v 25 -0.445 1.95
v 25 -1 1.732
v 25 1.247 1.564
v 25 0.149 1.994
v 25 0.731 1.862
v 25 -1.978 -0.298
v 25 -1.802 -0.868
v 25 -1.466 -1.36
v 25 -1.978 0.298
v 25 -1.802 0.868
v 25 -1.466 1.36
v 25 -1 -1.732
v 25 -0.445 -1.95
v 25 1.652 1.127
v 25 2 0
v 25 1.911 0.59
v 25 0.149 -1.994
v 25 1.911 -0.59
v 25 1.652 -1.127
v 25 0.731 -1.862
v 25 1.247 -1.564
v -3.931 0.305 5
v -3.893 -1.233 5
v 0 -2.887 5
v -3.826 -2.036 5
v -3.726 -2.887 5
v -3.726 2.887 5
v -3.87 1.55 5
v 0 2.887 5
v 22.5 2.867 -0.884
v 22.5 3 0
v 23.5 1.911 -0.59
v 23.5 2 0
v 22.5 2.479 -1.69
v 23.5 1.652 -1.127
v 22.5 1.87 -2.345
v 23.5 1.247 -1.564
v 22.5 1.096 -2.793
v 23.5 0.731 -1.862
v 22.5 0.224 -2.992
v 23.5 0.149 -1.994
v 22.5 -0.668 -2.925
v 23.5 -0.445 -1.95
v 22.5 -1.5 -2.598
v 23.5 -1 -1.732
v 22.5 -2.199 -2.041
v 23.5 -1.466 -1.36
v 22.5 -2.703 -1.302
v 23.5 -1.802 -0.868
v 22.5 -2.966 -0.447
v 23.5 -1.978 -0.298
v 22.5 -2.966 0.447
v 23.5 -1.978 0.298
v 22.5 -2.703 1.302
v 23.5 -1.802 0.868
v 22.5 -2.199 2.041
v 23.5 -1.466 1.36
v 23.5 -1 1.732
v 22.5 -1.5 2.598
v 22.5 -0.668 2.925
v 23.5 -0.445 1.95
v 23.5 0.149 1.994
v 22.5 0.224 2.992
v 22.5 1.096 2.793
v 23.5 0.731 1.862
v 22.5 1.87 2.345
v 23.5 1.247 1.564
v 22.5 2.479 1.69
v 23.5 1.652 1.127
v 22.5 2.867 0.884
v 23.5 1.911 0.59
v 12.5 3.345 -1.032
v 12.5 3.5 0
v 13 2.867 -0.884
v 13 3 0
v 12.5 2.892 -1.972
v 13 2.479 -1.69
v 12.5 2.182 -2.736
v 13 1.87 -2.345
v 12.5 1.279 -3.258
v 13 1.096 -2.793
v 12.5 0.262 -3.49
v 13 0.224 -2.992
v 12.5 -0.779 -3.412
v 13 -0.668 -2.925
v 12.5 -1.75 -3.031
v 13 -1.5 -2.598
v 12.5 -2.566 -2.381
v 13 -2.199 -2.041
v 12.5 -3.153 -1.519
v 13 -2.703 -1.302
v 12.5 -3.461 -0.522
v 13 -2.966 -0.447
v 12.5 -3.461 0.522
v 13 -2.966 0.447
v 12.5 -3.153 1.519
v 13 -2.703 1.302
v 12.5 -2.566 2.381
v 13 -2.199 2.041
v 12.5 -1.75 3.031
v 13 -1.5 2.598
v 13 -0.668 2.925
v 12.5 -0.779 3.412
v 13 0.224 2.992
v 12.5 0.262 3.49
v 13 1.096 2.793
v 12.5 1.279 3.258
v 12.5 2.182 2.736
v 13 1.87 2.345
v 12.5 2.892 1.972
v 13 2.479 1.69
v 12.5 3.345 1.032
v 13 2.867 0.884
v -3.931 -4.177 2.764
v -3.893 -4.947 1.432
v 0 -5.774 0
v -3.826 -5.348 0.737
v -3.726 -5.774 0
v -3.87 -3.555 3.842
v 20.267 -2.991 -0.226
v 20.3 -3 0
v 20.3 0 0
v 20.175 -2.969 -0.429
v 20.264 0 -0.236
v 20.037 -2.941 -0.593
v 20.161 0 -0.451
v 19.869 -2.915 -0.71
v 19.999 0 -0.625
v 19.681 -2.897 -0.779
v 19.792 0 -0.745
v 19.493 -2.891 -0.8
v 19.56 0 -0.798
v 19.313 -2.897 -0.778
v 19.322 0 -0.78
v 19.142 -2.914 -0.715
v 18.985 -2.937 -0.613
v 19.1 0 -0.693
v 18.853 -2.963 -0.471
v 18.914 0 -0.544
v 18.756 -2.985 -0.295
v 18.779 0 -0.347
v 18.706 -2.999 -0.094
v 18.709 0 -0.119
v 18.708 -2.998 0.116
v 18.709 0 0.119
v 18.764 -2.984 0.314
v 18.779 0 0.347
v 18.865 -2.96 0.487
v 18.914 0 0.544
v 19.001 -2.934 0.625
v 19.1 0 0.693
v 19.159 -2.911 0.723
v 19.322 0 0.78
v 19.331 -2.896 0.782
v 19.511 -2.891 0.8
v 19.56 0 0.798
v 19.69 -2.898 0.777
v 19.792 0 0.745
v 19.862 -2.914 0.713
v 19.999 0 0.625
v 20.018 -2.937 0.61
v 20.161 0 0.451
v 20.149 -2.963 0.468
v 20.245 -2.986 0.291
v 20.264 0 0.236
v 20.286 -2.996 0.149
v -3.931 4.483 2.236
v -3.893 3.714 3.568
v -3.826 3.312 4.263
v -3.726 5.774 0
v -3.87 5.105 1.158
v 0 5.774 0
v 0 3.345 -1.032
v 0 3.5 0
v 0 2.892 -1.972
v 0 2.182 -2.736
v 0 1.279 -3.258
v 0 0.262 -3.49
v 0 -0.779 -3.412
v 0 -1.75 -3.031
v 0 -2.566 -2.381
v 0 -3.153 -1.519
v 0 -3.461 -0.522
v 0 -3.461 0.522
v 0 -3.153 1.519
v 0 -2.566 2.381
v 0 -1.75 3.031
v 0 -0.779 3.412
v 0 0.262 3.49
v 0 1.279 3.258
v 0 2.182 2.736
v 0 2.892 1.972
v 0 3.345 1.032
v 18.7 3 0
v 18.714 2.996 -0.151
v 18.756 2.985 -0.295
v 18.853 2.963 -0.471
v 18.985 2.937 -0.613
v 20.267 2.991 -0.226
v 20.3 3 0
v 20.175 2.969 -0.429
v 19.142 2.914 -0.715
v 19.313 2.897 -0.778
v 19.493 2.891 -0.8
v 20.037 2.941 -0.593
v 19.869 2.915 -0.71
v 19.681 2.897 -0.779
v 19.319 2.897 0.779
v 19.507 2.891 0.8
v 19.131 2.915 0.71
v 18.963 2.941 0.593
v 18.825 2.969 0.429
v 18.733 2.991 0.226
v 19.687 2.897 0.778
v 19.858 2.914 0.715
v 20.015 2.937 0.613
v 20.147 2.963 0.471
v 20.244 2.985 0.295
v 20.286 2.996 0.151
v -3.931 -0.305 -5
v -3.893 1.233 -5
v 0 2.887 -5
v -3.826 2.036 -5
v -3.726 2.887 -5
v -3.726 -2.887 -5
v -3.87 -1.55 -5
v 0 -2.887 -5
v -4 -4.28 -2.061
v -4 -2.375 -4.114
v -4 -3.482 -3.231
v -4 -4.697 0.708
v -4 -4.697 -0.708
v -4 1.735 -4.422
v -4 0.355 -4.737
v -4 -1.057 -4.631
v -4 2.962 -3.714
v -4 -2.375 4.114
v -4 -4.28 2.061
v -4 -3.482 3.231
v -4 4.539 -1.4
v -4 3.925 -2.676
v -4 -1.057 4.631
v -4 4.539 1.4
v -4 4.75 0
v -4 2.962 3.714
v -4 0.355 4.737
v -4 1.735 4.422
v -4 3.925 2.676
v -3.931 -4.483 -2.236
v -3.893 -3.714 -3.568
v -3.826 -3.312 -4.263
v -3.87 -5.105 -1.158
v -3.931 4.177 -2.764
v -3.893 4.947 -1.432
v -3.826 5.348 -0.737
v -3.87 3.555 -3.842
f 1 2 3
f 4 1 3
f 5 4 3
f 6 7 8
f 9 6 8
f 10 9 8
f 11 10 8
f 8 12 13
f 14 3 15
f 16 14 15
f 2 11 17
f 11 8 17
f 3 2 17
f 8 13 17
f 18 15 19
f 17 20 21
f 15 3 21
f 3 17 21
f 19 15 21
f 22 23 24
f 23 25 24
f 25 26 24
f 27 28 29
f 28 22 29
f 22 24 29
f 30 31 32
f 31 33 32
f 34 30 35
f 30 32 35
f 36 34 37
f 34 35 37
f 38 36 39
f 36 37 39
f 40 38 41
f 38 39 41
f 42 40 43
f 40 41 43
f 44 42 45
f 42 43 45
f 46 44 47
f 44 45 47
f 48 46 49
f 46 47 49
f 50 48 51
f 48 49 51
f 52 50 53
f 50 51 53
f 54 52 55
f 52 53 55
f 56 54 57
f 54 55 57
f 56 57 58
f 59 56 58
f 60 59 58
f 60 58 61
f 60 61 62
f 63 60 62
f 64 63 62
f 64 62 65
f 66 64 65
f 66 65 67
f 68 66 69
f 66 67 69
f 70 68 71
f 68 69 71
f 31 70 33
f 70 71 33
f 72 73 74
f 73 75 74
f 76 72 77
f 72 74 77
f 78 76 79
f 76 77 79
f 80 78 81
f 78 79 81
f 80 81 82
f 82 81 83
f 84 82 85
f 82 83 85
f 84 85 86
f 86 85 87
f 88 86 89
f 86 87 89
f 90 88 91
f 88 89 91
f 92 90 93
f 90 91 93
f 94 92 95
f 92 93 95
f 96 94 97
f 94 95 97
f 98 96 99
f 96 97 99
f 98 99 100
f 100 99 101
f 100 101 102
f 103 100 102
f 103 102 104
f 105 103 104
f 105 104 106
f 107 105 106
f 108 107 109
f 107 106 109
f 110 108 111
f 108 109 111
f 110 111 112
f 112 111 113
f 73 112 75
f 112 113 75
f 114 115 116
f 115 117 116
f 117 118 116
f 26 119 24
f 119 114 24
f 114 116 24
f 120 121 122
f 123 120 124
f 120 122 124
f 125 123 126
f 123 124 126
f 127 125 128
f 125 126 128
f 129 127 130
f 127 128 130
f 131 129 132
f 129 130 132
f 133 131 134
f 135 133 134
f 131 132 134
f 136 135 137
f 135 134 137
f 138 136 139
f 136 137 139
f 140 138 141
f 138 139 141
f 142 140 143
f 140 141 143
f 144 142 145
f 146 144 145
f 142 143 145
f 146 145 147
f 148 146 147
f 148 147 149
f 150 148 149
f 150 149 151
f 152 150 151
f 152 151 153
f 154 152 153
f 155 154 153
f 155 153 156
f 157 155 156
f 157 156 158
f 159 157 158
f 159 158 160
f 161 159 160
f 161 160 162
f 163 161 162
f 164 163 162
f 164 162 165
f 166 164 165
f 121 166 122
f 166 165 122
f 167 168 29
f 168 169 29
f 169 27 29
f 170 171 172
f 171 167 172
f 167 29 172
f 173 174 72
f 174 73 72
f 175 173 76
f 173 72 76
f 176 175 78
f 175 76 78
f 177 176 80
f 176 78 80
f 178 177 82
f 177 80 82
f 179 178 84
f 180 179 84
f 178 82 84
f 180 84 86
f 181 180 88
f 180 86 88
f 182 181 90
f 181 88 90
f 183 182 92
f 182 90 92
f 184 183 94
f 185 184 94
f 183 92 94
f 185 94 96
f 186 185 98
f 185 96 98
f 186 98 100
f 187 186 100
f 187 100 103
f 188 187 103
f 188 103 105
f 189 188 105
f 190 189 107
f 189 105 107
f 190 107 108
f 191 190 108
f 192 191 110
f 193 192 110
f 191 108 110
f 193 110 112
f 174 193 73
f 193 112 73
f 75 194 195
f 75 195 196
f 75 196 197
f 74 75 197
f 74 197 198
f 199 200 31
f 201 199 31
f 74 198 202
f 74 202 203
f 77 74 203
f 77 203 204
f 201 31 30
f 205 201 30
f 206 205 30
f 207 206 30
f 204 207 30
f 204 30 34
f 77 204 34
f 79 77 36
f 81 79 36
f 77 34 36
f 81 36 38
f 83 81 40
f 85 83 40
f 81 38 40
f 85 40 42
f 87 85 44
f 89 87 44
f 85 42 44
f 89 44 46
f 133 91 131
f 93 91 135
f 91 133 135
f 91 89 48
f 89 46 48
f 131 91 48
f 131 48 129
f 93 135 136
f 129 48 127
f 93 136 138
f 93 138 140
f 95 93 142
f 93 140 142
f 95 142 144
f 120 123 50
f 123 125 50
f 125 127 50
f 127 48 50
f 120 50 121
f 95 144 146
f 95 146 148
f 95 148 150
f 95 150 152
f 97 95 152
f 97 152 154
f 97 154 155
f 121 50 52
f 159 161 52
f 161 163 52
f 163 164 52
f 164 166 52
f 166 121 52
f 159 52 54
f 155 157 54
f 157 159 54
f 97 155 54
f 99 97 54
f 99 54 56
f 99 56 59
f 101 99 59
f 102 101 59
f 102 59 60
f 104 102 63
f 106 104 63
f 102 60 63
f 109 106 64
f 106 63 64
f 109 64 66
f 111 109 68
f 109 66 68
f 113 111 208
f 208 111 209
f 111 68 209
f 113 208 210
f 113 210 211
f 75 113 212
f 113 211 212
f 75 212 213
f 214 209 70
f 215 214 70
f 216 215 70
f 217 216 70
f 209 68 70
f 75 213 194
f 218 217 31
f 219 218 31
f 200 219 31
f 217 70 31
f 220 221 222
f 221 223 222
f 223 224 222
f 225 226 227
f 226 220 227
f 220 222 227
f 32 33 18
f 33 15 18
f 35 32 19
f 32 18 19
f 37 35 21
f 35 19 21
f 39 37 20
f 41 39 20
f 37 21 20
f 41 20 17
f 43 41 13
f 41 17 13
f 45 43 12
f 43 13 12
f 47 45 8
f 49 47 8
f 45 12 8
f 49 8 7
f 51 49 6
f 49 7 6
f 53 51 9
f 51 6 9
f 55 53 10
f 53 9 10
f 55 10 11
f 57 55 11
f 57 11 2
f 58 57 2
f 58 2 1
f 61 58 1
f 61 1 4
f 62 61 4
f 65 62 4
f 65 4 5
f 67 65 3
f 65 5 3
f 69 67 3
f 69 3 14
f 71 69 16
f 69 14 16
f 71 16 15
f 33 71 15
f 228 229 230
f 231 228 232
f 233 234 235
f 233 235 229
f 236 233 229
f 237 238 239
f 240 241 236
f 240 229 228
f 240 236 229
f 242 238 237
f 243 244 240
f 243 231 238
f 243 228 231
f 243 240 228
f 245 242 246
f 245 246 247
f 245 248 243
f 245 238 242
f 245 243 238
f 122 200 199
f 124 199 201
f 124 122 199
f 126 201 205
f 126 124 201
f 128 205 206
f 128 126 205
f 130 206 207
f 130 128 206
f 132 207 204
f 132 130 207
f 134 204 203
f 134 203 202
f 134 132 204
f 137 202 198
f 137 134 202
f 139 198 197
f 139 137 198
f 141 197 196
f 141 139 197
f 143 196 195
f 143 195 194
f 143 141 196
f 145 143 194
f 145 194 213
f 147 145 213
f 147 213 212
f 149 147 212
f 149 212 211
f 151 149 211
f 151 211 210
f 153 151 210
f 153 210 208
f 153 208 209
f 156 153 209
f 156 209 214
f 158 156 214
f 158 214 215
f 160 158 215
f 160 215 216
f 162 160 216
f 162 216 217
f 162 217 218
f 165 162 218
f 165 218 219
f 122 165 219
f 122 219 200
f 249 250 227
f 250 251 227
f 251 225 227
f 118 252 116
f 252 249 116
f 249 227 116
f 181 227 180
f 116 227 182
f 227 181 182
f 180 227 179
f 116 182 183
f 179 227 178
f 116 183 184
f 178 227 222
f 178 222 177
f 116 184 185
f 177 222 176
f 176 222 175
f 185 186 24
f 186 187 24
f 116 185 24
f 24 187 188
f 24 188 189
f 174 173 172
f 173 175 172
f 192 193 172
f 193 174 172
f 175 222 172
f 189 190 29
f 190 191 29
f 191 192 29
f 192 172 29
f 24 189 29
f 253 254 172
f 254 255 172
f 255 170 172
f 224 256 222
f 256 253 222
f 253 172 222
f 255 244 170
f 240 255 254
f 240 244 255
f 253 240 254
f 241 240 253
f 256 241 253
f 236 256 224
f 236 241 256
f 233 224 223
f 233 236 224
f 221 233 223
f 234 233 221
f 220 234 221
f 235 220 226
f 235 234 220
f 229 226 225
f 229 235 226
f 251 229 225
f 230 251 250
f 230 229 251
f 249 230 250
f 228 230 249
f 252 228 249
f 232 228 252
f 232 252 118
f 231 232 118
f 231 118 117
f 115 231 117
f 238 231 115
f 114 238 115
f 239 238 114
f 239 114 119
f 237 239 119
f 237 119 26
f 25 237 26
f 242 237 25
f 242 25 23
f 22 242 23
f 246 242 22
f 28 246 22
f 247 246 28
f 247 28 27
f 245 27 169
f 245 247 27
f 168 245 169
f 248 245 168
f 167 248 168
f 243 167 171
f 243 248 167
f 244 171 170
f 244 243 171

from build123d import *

# Parameters (mm, degrees)
BASEHEAD_DEPTH  = 4
SKE2_R          = 0.8
HOLE_DEPTH      = 6.773502692
HOLE_DEPTH_BACK = 6.773502692


with BuildPart() as part:
    # BodySke → BaseBody (revolve)
    with BuildSketch(Plane.XY):
        Polygon((0, 0), (0, 3.5), (12.5, 3.5), (13, 3), (22.5, 3), (23.5, 2), (25, 2), (25, 0), align=None)
    revolve(axis=Axis((0, 0, 0), (-1, 0, 0)))

    # Ske → BaseHead (add)
    with BuildSketch(Plane.ZY):
        Polygon((0, 5.773502692), (-5, 2.886751346), (-5, -2.886751346), (0, -5.773502692), (5, -2.886751346), (5, 2.886751346), align=None)
    extrude(amount=BASEHEAD_DEPTH)

    # Ske1 → HeadFillet (revolve, cut)
    with BuildSketch(Plane.XY):
        Polygon((-4, 5.773502692), (-3.72575328, 5.773502692), (-4, 4.75), align=None)
    revolve(axis=Axis((0, 0, 0), (-1, 0, 0)), mode=Mode.SUBTRACT)

    # Ske2 → Hole (cut, two sides)
    with BuildSketch(Plane(origin=(0, 0, 0), x_dir=(1, 0, 0), z_dir=(0, 1, 0))) as hole_sk:
        with Locations((19.5, 0)):
            Circle(SKE2_R)
    extrude(amount=HOLE_DEPTH, mode=Mode.SUBTRACT)
    extrude(hole_sk.sketch, amount=-HOLE_DEPTH_BACK, mode=Mode.SUBTRACT)


solid = part.part
